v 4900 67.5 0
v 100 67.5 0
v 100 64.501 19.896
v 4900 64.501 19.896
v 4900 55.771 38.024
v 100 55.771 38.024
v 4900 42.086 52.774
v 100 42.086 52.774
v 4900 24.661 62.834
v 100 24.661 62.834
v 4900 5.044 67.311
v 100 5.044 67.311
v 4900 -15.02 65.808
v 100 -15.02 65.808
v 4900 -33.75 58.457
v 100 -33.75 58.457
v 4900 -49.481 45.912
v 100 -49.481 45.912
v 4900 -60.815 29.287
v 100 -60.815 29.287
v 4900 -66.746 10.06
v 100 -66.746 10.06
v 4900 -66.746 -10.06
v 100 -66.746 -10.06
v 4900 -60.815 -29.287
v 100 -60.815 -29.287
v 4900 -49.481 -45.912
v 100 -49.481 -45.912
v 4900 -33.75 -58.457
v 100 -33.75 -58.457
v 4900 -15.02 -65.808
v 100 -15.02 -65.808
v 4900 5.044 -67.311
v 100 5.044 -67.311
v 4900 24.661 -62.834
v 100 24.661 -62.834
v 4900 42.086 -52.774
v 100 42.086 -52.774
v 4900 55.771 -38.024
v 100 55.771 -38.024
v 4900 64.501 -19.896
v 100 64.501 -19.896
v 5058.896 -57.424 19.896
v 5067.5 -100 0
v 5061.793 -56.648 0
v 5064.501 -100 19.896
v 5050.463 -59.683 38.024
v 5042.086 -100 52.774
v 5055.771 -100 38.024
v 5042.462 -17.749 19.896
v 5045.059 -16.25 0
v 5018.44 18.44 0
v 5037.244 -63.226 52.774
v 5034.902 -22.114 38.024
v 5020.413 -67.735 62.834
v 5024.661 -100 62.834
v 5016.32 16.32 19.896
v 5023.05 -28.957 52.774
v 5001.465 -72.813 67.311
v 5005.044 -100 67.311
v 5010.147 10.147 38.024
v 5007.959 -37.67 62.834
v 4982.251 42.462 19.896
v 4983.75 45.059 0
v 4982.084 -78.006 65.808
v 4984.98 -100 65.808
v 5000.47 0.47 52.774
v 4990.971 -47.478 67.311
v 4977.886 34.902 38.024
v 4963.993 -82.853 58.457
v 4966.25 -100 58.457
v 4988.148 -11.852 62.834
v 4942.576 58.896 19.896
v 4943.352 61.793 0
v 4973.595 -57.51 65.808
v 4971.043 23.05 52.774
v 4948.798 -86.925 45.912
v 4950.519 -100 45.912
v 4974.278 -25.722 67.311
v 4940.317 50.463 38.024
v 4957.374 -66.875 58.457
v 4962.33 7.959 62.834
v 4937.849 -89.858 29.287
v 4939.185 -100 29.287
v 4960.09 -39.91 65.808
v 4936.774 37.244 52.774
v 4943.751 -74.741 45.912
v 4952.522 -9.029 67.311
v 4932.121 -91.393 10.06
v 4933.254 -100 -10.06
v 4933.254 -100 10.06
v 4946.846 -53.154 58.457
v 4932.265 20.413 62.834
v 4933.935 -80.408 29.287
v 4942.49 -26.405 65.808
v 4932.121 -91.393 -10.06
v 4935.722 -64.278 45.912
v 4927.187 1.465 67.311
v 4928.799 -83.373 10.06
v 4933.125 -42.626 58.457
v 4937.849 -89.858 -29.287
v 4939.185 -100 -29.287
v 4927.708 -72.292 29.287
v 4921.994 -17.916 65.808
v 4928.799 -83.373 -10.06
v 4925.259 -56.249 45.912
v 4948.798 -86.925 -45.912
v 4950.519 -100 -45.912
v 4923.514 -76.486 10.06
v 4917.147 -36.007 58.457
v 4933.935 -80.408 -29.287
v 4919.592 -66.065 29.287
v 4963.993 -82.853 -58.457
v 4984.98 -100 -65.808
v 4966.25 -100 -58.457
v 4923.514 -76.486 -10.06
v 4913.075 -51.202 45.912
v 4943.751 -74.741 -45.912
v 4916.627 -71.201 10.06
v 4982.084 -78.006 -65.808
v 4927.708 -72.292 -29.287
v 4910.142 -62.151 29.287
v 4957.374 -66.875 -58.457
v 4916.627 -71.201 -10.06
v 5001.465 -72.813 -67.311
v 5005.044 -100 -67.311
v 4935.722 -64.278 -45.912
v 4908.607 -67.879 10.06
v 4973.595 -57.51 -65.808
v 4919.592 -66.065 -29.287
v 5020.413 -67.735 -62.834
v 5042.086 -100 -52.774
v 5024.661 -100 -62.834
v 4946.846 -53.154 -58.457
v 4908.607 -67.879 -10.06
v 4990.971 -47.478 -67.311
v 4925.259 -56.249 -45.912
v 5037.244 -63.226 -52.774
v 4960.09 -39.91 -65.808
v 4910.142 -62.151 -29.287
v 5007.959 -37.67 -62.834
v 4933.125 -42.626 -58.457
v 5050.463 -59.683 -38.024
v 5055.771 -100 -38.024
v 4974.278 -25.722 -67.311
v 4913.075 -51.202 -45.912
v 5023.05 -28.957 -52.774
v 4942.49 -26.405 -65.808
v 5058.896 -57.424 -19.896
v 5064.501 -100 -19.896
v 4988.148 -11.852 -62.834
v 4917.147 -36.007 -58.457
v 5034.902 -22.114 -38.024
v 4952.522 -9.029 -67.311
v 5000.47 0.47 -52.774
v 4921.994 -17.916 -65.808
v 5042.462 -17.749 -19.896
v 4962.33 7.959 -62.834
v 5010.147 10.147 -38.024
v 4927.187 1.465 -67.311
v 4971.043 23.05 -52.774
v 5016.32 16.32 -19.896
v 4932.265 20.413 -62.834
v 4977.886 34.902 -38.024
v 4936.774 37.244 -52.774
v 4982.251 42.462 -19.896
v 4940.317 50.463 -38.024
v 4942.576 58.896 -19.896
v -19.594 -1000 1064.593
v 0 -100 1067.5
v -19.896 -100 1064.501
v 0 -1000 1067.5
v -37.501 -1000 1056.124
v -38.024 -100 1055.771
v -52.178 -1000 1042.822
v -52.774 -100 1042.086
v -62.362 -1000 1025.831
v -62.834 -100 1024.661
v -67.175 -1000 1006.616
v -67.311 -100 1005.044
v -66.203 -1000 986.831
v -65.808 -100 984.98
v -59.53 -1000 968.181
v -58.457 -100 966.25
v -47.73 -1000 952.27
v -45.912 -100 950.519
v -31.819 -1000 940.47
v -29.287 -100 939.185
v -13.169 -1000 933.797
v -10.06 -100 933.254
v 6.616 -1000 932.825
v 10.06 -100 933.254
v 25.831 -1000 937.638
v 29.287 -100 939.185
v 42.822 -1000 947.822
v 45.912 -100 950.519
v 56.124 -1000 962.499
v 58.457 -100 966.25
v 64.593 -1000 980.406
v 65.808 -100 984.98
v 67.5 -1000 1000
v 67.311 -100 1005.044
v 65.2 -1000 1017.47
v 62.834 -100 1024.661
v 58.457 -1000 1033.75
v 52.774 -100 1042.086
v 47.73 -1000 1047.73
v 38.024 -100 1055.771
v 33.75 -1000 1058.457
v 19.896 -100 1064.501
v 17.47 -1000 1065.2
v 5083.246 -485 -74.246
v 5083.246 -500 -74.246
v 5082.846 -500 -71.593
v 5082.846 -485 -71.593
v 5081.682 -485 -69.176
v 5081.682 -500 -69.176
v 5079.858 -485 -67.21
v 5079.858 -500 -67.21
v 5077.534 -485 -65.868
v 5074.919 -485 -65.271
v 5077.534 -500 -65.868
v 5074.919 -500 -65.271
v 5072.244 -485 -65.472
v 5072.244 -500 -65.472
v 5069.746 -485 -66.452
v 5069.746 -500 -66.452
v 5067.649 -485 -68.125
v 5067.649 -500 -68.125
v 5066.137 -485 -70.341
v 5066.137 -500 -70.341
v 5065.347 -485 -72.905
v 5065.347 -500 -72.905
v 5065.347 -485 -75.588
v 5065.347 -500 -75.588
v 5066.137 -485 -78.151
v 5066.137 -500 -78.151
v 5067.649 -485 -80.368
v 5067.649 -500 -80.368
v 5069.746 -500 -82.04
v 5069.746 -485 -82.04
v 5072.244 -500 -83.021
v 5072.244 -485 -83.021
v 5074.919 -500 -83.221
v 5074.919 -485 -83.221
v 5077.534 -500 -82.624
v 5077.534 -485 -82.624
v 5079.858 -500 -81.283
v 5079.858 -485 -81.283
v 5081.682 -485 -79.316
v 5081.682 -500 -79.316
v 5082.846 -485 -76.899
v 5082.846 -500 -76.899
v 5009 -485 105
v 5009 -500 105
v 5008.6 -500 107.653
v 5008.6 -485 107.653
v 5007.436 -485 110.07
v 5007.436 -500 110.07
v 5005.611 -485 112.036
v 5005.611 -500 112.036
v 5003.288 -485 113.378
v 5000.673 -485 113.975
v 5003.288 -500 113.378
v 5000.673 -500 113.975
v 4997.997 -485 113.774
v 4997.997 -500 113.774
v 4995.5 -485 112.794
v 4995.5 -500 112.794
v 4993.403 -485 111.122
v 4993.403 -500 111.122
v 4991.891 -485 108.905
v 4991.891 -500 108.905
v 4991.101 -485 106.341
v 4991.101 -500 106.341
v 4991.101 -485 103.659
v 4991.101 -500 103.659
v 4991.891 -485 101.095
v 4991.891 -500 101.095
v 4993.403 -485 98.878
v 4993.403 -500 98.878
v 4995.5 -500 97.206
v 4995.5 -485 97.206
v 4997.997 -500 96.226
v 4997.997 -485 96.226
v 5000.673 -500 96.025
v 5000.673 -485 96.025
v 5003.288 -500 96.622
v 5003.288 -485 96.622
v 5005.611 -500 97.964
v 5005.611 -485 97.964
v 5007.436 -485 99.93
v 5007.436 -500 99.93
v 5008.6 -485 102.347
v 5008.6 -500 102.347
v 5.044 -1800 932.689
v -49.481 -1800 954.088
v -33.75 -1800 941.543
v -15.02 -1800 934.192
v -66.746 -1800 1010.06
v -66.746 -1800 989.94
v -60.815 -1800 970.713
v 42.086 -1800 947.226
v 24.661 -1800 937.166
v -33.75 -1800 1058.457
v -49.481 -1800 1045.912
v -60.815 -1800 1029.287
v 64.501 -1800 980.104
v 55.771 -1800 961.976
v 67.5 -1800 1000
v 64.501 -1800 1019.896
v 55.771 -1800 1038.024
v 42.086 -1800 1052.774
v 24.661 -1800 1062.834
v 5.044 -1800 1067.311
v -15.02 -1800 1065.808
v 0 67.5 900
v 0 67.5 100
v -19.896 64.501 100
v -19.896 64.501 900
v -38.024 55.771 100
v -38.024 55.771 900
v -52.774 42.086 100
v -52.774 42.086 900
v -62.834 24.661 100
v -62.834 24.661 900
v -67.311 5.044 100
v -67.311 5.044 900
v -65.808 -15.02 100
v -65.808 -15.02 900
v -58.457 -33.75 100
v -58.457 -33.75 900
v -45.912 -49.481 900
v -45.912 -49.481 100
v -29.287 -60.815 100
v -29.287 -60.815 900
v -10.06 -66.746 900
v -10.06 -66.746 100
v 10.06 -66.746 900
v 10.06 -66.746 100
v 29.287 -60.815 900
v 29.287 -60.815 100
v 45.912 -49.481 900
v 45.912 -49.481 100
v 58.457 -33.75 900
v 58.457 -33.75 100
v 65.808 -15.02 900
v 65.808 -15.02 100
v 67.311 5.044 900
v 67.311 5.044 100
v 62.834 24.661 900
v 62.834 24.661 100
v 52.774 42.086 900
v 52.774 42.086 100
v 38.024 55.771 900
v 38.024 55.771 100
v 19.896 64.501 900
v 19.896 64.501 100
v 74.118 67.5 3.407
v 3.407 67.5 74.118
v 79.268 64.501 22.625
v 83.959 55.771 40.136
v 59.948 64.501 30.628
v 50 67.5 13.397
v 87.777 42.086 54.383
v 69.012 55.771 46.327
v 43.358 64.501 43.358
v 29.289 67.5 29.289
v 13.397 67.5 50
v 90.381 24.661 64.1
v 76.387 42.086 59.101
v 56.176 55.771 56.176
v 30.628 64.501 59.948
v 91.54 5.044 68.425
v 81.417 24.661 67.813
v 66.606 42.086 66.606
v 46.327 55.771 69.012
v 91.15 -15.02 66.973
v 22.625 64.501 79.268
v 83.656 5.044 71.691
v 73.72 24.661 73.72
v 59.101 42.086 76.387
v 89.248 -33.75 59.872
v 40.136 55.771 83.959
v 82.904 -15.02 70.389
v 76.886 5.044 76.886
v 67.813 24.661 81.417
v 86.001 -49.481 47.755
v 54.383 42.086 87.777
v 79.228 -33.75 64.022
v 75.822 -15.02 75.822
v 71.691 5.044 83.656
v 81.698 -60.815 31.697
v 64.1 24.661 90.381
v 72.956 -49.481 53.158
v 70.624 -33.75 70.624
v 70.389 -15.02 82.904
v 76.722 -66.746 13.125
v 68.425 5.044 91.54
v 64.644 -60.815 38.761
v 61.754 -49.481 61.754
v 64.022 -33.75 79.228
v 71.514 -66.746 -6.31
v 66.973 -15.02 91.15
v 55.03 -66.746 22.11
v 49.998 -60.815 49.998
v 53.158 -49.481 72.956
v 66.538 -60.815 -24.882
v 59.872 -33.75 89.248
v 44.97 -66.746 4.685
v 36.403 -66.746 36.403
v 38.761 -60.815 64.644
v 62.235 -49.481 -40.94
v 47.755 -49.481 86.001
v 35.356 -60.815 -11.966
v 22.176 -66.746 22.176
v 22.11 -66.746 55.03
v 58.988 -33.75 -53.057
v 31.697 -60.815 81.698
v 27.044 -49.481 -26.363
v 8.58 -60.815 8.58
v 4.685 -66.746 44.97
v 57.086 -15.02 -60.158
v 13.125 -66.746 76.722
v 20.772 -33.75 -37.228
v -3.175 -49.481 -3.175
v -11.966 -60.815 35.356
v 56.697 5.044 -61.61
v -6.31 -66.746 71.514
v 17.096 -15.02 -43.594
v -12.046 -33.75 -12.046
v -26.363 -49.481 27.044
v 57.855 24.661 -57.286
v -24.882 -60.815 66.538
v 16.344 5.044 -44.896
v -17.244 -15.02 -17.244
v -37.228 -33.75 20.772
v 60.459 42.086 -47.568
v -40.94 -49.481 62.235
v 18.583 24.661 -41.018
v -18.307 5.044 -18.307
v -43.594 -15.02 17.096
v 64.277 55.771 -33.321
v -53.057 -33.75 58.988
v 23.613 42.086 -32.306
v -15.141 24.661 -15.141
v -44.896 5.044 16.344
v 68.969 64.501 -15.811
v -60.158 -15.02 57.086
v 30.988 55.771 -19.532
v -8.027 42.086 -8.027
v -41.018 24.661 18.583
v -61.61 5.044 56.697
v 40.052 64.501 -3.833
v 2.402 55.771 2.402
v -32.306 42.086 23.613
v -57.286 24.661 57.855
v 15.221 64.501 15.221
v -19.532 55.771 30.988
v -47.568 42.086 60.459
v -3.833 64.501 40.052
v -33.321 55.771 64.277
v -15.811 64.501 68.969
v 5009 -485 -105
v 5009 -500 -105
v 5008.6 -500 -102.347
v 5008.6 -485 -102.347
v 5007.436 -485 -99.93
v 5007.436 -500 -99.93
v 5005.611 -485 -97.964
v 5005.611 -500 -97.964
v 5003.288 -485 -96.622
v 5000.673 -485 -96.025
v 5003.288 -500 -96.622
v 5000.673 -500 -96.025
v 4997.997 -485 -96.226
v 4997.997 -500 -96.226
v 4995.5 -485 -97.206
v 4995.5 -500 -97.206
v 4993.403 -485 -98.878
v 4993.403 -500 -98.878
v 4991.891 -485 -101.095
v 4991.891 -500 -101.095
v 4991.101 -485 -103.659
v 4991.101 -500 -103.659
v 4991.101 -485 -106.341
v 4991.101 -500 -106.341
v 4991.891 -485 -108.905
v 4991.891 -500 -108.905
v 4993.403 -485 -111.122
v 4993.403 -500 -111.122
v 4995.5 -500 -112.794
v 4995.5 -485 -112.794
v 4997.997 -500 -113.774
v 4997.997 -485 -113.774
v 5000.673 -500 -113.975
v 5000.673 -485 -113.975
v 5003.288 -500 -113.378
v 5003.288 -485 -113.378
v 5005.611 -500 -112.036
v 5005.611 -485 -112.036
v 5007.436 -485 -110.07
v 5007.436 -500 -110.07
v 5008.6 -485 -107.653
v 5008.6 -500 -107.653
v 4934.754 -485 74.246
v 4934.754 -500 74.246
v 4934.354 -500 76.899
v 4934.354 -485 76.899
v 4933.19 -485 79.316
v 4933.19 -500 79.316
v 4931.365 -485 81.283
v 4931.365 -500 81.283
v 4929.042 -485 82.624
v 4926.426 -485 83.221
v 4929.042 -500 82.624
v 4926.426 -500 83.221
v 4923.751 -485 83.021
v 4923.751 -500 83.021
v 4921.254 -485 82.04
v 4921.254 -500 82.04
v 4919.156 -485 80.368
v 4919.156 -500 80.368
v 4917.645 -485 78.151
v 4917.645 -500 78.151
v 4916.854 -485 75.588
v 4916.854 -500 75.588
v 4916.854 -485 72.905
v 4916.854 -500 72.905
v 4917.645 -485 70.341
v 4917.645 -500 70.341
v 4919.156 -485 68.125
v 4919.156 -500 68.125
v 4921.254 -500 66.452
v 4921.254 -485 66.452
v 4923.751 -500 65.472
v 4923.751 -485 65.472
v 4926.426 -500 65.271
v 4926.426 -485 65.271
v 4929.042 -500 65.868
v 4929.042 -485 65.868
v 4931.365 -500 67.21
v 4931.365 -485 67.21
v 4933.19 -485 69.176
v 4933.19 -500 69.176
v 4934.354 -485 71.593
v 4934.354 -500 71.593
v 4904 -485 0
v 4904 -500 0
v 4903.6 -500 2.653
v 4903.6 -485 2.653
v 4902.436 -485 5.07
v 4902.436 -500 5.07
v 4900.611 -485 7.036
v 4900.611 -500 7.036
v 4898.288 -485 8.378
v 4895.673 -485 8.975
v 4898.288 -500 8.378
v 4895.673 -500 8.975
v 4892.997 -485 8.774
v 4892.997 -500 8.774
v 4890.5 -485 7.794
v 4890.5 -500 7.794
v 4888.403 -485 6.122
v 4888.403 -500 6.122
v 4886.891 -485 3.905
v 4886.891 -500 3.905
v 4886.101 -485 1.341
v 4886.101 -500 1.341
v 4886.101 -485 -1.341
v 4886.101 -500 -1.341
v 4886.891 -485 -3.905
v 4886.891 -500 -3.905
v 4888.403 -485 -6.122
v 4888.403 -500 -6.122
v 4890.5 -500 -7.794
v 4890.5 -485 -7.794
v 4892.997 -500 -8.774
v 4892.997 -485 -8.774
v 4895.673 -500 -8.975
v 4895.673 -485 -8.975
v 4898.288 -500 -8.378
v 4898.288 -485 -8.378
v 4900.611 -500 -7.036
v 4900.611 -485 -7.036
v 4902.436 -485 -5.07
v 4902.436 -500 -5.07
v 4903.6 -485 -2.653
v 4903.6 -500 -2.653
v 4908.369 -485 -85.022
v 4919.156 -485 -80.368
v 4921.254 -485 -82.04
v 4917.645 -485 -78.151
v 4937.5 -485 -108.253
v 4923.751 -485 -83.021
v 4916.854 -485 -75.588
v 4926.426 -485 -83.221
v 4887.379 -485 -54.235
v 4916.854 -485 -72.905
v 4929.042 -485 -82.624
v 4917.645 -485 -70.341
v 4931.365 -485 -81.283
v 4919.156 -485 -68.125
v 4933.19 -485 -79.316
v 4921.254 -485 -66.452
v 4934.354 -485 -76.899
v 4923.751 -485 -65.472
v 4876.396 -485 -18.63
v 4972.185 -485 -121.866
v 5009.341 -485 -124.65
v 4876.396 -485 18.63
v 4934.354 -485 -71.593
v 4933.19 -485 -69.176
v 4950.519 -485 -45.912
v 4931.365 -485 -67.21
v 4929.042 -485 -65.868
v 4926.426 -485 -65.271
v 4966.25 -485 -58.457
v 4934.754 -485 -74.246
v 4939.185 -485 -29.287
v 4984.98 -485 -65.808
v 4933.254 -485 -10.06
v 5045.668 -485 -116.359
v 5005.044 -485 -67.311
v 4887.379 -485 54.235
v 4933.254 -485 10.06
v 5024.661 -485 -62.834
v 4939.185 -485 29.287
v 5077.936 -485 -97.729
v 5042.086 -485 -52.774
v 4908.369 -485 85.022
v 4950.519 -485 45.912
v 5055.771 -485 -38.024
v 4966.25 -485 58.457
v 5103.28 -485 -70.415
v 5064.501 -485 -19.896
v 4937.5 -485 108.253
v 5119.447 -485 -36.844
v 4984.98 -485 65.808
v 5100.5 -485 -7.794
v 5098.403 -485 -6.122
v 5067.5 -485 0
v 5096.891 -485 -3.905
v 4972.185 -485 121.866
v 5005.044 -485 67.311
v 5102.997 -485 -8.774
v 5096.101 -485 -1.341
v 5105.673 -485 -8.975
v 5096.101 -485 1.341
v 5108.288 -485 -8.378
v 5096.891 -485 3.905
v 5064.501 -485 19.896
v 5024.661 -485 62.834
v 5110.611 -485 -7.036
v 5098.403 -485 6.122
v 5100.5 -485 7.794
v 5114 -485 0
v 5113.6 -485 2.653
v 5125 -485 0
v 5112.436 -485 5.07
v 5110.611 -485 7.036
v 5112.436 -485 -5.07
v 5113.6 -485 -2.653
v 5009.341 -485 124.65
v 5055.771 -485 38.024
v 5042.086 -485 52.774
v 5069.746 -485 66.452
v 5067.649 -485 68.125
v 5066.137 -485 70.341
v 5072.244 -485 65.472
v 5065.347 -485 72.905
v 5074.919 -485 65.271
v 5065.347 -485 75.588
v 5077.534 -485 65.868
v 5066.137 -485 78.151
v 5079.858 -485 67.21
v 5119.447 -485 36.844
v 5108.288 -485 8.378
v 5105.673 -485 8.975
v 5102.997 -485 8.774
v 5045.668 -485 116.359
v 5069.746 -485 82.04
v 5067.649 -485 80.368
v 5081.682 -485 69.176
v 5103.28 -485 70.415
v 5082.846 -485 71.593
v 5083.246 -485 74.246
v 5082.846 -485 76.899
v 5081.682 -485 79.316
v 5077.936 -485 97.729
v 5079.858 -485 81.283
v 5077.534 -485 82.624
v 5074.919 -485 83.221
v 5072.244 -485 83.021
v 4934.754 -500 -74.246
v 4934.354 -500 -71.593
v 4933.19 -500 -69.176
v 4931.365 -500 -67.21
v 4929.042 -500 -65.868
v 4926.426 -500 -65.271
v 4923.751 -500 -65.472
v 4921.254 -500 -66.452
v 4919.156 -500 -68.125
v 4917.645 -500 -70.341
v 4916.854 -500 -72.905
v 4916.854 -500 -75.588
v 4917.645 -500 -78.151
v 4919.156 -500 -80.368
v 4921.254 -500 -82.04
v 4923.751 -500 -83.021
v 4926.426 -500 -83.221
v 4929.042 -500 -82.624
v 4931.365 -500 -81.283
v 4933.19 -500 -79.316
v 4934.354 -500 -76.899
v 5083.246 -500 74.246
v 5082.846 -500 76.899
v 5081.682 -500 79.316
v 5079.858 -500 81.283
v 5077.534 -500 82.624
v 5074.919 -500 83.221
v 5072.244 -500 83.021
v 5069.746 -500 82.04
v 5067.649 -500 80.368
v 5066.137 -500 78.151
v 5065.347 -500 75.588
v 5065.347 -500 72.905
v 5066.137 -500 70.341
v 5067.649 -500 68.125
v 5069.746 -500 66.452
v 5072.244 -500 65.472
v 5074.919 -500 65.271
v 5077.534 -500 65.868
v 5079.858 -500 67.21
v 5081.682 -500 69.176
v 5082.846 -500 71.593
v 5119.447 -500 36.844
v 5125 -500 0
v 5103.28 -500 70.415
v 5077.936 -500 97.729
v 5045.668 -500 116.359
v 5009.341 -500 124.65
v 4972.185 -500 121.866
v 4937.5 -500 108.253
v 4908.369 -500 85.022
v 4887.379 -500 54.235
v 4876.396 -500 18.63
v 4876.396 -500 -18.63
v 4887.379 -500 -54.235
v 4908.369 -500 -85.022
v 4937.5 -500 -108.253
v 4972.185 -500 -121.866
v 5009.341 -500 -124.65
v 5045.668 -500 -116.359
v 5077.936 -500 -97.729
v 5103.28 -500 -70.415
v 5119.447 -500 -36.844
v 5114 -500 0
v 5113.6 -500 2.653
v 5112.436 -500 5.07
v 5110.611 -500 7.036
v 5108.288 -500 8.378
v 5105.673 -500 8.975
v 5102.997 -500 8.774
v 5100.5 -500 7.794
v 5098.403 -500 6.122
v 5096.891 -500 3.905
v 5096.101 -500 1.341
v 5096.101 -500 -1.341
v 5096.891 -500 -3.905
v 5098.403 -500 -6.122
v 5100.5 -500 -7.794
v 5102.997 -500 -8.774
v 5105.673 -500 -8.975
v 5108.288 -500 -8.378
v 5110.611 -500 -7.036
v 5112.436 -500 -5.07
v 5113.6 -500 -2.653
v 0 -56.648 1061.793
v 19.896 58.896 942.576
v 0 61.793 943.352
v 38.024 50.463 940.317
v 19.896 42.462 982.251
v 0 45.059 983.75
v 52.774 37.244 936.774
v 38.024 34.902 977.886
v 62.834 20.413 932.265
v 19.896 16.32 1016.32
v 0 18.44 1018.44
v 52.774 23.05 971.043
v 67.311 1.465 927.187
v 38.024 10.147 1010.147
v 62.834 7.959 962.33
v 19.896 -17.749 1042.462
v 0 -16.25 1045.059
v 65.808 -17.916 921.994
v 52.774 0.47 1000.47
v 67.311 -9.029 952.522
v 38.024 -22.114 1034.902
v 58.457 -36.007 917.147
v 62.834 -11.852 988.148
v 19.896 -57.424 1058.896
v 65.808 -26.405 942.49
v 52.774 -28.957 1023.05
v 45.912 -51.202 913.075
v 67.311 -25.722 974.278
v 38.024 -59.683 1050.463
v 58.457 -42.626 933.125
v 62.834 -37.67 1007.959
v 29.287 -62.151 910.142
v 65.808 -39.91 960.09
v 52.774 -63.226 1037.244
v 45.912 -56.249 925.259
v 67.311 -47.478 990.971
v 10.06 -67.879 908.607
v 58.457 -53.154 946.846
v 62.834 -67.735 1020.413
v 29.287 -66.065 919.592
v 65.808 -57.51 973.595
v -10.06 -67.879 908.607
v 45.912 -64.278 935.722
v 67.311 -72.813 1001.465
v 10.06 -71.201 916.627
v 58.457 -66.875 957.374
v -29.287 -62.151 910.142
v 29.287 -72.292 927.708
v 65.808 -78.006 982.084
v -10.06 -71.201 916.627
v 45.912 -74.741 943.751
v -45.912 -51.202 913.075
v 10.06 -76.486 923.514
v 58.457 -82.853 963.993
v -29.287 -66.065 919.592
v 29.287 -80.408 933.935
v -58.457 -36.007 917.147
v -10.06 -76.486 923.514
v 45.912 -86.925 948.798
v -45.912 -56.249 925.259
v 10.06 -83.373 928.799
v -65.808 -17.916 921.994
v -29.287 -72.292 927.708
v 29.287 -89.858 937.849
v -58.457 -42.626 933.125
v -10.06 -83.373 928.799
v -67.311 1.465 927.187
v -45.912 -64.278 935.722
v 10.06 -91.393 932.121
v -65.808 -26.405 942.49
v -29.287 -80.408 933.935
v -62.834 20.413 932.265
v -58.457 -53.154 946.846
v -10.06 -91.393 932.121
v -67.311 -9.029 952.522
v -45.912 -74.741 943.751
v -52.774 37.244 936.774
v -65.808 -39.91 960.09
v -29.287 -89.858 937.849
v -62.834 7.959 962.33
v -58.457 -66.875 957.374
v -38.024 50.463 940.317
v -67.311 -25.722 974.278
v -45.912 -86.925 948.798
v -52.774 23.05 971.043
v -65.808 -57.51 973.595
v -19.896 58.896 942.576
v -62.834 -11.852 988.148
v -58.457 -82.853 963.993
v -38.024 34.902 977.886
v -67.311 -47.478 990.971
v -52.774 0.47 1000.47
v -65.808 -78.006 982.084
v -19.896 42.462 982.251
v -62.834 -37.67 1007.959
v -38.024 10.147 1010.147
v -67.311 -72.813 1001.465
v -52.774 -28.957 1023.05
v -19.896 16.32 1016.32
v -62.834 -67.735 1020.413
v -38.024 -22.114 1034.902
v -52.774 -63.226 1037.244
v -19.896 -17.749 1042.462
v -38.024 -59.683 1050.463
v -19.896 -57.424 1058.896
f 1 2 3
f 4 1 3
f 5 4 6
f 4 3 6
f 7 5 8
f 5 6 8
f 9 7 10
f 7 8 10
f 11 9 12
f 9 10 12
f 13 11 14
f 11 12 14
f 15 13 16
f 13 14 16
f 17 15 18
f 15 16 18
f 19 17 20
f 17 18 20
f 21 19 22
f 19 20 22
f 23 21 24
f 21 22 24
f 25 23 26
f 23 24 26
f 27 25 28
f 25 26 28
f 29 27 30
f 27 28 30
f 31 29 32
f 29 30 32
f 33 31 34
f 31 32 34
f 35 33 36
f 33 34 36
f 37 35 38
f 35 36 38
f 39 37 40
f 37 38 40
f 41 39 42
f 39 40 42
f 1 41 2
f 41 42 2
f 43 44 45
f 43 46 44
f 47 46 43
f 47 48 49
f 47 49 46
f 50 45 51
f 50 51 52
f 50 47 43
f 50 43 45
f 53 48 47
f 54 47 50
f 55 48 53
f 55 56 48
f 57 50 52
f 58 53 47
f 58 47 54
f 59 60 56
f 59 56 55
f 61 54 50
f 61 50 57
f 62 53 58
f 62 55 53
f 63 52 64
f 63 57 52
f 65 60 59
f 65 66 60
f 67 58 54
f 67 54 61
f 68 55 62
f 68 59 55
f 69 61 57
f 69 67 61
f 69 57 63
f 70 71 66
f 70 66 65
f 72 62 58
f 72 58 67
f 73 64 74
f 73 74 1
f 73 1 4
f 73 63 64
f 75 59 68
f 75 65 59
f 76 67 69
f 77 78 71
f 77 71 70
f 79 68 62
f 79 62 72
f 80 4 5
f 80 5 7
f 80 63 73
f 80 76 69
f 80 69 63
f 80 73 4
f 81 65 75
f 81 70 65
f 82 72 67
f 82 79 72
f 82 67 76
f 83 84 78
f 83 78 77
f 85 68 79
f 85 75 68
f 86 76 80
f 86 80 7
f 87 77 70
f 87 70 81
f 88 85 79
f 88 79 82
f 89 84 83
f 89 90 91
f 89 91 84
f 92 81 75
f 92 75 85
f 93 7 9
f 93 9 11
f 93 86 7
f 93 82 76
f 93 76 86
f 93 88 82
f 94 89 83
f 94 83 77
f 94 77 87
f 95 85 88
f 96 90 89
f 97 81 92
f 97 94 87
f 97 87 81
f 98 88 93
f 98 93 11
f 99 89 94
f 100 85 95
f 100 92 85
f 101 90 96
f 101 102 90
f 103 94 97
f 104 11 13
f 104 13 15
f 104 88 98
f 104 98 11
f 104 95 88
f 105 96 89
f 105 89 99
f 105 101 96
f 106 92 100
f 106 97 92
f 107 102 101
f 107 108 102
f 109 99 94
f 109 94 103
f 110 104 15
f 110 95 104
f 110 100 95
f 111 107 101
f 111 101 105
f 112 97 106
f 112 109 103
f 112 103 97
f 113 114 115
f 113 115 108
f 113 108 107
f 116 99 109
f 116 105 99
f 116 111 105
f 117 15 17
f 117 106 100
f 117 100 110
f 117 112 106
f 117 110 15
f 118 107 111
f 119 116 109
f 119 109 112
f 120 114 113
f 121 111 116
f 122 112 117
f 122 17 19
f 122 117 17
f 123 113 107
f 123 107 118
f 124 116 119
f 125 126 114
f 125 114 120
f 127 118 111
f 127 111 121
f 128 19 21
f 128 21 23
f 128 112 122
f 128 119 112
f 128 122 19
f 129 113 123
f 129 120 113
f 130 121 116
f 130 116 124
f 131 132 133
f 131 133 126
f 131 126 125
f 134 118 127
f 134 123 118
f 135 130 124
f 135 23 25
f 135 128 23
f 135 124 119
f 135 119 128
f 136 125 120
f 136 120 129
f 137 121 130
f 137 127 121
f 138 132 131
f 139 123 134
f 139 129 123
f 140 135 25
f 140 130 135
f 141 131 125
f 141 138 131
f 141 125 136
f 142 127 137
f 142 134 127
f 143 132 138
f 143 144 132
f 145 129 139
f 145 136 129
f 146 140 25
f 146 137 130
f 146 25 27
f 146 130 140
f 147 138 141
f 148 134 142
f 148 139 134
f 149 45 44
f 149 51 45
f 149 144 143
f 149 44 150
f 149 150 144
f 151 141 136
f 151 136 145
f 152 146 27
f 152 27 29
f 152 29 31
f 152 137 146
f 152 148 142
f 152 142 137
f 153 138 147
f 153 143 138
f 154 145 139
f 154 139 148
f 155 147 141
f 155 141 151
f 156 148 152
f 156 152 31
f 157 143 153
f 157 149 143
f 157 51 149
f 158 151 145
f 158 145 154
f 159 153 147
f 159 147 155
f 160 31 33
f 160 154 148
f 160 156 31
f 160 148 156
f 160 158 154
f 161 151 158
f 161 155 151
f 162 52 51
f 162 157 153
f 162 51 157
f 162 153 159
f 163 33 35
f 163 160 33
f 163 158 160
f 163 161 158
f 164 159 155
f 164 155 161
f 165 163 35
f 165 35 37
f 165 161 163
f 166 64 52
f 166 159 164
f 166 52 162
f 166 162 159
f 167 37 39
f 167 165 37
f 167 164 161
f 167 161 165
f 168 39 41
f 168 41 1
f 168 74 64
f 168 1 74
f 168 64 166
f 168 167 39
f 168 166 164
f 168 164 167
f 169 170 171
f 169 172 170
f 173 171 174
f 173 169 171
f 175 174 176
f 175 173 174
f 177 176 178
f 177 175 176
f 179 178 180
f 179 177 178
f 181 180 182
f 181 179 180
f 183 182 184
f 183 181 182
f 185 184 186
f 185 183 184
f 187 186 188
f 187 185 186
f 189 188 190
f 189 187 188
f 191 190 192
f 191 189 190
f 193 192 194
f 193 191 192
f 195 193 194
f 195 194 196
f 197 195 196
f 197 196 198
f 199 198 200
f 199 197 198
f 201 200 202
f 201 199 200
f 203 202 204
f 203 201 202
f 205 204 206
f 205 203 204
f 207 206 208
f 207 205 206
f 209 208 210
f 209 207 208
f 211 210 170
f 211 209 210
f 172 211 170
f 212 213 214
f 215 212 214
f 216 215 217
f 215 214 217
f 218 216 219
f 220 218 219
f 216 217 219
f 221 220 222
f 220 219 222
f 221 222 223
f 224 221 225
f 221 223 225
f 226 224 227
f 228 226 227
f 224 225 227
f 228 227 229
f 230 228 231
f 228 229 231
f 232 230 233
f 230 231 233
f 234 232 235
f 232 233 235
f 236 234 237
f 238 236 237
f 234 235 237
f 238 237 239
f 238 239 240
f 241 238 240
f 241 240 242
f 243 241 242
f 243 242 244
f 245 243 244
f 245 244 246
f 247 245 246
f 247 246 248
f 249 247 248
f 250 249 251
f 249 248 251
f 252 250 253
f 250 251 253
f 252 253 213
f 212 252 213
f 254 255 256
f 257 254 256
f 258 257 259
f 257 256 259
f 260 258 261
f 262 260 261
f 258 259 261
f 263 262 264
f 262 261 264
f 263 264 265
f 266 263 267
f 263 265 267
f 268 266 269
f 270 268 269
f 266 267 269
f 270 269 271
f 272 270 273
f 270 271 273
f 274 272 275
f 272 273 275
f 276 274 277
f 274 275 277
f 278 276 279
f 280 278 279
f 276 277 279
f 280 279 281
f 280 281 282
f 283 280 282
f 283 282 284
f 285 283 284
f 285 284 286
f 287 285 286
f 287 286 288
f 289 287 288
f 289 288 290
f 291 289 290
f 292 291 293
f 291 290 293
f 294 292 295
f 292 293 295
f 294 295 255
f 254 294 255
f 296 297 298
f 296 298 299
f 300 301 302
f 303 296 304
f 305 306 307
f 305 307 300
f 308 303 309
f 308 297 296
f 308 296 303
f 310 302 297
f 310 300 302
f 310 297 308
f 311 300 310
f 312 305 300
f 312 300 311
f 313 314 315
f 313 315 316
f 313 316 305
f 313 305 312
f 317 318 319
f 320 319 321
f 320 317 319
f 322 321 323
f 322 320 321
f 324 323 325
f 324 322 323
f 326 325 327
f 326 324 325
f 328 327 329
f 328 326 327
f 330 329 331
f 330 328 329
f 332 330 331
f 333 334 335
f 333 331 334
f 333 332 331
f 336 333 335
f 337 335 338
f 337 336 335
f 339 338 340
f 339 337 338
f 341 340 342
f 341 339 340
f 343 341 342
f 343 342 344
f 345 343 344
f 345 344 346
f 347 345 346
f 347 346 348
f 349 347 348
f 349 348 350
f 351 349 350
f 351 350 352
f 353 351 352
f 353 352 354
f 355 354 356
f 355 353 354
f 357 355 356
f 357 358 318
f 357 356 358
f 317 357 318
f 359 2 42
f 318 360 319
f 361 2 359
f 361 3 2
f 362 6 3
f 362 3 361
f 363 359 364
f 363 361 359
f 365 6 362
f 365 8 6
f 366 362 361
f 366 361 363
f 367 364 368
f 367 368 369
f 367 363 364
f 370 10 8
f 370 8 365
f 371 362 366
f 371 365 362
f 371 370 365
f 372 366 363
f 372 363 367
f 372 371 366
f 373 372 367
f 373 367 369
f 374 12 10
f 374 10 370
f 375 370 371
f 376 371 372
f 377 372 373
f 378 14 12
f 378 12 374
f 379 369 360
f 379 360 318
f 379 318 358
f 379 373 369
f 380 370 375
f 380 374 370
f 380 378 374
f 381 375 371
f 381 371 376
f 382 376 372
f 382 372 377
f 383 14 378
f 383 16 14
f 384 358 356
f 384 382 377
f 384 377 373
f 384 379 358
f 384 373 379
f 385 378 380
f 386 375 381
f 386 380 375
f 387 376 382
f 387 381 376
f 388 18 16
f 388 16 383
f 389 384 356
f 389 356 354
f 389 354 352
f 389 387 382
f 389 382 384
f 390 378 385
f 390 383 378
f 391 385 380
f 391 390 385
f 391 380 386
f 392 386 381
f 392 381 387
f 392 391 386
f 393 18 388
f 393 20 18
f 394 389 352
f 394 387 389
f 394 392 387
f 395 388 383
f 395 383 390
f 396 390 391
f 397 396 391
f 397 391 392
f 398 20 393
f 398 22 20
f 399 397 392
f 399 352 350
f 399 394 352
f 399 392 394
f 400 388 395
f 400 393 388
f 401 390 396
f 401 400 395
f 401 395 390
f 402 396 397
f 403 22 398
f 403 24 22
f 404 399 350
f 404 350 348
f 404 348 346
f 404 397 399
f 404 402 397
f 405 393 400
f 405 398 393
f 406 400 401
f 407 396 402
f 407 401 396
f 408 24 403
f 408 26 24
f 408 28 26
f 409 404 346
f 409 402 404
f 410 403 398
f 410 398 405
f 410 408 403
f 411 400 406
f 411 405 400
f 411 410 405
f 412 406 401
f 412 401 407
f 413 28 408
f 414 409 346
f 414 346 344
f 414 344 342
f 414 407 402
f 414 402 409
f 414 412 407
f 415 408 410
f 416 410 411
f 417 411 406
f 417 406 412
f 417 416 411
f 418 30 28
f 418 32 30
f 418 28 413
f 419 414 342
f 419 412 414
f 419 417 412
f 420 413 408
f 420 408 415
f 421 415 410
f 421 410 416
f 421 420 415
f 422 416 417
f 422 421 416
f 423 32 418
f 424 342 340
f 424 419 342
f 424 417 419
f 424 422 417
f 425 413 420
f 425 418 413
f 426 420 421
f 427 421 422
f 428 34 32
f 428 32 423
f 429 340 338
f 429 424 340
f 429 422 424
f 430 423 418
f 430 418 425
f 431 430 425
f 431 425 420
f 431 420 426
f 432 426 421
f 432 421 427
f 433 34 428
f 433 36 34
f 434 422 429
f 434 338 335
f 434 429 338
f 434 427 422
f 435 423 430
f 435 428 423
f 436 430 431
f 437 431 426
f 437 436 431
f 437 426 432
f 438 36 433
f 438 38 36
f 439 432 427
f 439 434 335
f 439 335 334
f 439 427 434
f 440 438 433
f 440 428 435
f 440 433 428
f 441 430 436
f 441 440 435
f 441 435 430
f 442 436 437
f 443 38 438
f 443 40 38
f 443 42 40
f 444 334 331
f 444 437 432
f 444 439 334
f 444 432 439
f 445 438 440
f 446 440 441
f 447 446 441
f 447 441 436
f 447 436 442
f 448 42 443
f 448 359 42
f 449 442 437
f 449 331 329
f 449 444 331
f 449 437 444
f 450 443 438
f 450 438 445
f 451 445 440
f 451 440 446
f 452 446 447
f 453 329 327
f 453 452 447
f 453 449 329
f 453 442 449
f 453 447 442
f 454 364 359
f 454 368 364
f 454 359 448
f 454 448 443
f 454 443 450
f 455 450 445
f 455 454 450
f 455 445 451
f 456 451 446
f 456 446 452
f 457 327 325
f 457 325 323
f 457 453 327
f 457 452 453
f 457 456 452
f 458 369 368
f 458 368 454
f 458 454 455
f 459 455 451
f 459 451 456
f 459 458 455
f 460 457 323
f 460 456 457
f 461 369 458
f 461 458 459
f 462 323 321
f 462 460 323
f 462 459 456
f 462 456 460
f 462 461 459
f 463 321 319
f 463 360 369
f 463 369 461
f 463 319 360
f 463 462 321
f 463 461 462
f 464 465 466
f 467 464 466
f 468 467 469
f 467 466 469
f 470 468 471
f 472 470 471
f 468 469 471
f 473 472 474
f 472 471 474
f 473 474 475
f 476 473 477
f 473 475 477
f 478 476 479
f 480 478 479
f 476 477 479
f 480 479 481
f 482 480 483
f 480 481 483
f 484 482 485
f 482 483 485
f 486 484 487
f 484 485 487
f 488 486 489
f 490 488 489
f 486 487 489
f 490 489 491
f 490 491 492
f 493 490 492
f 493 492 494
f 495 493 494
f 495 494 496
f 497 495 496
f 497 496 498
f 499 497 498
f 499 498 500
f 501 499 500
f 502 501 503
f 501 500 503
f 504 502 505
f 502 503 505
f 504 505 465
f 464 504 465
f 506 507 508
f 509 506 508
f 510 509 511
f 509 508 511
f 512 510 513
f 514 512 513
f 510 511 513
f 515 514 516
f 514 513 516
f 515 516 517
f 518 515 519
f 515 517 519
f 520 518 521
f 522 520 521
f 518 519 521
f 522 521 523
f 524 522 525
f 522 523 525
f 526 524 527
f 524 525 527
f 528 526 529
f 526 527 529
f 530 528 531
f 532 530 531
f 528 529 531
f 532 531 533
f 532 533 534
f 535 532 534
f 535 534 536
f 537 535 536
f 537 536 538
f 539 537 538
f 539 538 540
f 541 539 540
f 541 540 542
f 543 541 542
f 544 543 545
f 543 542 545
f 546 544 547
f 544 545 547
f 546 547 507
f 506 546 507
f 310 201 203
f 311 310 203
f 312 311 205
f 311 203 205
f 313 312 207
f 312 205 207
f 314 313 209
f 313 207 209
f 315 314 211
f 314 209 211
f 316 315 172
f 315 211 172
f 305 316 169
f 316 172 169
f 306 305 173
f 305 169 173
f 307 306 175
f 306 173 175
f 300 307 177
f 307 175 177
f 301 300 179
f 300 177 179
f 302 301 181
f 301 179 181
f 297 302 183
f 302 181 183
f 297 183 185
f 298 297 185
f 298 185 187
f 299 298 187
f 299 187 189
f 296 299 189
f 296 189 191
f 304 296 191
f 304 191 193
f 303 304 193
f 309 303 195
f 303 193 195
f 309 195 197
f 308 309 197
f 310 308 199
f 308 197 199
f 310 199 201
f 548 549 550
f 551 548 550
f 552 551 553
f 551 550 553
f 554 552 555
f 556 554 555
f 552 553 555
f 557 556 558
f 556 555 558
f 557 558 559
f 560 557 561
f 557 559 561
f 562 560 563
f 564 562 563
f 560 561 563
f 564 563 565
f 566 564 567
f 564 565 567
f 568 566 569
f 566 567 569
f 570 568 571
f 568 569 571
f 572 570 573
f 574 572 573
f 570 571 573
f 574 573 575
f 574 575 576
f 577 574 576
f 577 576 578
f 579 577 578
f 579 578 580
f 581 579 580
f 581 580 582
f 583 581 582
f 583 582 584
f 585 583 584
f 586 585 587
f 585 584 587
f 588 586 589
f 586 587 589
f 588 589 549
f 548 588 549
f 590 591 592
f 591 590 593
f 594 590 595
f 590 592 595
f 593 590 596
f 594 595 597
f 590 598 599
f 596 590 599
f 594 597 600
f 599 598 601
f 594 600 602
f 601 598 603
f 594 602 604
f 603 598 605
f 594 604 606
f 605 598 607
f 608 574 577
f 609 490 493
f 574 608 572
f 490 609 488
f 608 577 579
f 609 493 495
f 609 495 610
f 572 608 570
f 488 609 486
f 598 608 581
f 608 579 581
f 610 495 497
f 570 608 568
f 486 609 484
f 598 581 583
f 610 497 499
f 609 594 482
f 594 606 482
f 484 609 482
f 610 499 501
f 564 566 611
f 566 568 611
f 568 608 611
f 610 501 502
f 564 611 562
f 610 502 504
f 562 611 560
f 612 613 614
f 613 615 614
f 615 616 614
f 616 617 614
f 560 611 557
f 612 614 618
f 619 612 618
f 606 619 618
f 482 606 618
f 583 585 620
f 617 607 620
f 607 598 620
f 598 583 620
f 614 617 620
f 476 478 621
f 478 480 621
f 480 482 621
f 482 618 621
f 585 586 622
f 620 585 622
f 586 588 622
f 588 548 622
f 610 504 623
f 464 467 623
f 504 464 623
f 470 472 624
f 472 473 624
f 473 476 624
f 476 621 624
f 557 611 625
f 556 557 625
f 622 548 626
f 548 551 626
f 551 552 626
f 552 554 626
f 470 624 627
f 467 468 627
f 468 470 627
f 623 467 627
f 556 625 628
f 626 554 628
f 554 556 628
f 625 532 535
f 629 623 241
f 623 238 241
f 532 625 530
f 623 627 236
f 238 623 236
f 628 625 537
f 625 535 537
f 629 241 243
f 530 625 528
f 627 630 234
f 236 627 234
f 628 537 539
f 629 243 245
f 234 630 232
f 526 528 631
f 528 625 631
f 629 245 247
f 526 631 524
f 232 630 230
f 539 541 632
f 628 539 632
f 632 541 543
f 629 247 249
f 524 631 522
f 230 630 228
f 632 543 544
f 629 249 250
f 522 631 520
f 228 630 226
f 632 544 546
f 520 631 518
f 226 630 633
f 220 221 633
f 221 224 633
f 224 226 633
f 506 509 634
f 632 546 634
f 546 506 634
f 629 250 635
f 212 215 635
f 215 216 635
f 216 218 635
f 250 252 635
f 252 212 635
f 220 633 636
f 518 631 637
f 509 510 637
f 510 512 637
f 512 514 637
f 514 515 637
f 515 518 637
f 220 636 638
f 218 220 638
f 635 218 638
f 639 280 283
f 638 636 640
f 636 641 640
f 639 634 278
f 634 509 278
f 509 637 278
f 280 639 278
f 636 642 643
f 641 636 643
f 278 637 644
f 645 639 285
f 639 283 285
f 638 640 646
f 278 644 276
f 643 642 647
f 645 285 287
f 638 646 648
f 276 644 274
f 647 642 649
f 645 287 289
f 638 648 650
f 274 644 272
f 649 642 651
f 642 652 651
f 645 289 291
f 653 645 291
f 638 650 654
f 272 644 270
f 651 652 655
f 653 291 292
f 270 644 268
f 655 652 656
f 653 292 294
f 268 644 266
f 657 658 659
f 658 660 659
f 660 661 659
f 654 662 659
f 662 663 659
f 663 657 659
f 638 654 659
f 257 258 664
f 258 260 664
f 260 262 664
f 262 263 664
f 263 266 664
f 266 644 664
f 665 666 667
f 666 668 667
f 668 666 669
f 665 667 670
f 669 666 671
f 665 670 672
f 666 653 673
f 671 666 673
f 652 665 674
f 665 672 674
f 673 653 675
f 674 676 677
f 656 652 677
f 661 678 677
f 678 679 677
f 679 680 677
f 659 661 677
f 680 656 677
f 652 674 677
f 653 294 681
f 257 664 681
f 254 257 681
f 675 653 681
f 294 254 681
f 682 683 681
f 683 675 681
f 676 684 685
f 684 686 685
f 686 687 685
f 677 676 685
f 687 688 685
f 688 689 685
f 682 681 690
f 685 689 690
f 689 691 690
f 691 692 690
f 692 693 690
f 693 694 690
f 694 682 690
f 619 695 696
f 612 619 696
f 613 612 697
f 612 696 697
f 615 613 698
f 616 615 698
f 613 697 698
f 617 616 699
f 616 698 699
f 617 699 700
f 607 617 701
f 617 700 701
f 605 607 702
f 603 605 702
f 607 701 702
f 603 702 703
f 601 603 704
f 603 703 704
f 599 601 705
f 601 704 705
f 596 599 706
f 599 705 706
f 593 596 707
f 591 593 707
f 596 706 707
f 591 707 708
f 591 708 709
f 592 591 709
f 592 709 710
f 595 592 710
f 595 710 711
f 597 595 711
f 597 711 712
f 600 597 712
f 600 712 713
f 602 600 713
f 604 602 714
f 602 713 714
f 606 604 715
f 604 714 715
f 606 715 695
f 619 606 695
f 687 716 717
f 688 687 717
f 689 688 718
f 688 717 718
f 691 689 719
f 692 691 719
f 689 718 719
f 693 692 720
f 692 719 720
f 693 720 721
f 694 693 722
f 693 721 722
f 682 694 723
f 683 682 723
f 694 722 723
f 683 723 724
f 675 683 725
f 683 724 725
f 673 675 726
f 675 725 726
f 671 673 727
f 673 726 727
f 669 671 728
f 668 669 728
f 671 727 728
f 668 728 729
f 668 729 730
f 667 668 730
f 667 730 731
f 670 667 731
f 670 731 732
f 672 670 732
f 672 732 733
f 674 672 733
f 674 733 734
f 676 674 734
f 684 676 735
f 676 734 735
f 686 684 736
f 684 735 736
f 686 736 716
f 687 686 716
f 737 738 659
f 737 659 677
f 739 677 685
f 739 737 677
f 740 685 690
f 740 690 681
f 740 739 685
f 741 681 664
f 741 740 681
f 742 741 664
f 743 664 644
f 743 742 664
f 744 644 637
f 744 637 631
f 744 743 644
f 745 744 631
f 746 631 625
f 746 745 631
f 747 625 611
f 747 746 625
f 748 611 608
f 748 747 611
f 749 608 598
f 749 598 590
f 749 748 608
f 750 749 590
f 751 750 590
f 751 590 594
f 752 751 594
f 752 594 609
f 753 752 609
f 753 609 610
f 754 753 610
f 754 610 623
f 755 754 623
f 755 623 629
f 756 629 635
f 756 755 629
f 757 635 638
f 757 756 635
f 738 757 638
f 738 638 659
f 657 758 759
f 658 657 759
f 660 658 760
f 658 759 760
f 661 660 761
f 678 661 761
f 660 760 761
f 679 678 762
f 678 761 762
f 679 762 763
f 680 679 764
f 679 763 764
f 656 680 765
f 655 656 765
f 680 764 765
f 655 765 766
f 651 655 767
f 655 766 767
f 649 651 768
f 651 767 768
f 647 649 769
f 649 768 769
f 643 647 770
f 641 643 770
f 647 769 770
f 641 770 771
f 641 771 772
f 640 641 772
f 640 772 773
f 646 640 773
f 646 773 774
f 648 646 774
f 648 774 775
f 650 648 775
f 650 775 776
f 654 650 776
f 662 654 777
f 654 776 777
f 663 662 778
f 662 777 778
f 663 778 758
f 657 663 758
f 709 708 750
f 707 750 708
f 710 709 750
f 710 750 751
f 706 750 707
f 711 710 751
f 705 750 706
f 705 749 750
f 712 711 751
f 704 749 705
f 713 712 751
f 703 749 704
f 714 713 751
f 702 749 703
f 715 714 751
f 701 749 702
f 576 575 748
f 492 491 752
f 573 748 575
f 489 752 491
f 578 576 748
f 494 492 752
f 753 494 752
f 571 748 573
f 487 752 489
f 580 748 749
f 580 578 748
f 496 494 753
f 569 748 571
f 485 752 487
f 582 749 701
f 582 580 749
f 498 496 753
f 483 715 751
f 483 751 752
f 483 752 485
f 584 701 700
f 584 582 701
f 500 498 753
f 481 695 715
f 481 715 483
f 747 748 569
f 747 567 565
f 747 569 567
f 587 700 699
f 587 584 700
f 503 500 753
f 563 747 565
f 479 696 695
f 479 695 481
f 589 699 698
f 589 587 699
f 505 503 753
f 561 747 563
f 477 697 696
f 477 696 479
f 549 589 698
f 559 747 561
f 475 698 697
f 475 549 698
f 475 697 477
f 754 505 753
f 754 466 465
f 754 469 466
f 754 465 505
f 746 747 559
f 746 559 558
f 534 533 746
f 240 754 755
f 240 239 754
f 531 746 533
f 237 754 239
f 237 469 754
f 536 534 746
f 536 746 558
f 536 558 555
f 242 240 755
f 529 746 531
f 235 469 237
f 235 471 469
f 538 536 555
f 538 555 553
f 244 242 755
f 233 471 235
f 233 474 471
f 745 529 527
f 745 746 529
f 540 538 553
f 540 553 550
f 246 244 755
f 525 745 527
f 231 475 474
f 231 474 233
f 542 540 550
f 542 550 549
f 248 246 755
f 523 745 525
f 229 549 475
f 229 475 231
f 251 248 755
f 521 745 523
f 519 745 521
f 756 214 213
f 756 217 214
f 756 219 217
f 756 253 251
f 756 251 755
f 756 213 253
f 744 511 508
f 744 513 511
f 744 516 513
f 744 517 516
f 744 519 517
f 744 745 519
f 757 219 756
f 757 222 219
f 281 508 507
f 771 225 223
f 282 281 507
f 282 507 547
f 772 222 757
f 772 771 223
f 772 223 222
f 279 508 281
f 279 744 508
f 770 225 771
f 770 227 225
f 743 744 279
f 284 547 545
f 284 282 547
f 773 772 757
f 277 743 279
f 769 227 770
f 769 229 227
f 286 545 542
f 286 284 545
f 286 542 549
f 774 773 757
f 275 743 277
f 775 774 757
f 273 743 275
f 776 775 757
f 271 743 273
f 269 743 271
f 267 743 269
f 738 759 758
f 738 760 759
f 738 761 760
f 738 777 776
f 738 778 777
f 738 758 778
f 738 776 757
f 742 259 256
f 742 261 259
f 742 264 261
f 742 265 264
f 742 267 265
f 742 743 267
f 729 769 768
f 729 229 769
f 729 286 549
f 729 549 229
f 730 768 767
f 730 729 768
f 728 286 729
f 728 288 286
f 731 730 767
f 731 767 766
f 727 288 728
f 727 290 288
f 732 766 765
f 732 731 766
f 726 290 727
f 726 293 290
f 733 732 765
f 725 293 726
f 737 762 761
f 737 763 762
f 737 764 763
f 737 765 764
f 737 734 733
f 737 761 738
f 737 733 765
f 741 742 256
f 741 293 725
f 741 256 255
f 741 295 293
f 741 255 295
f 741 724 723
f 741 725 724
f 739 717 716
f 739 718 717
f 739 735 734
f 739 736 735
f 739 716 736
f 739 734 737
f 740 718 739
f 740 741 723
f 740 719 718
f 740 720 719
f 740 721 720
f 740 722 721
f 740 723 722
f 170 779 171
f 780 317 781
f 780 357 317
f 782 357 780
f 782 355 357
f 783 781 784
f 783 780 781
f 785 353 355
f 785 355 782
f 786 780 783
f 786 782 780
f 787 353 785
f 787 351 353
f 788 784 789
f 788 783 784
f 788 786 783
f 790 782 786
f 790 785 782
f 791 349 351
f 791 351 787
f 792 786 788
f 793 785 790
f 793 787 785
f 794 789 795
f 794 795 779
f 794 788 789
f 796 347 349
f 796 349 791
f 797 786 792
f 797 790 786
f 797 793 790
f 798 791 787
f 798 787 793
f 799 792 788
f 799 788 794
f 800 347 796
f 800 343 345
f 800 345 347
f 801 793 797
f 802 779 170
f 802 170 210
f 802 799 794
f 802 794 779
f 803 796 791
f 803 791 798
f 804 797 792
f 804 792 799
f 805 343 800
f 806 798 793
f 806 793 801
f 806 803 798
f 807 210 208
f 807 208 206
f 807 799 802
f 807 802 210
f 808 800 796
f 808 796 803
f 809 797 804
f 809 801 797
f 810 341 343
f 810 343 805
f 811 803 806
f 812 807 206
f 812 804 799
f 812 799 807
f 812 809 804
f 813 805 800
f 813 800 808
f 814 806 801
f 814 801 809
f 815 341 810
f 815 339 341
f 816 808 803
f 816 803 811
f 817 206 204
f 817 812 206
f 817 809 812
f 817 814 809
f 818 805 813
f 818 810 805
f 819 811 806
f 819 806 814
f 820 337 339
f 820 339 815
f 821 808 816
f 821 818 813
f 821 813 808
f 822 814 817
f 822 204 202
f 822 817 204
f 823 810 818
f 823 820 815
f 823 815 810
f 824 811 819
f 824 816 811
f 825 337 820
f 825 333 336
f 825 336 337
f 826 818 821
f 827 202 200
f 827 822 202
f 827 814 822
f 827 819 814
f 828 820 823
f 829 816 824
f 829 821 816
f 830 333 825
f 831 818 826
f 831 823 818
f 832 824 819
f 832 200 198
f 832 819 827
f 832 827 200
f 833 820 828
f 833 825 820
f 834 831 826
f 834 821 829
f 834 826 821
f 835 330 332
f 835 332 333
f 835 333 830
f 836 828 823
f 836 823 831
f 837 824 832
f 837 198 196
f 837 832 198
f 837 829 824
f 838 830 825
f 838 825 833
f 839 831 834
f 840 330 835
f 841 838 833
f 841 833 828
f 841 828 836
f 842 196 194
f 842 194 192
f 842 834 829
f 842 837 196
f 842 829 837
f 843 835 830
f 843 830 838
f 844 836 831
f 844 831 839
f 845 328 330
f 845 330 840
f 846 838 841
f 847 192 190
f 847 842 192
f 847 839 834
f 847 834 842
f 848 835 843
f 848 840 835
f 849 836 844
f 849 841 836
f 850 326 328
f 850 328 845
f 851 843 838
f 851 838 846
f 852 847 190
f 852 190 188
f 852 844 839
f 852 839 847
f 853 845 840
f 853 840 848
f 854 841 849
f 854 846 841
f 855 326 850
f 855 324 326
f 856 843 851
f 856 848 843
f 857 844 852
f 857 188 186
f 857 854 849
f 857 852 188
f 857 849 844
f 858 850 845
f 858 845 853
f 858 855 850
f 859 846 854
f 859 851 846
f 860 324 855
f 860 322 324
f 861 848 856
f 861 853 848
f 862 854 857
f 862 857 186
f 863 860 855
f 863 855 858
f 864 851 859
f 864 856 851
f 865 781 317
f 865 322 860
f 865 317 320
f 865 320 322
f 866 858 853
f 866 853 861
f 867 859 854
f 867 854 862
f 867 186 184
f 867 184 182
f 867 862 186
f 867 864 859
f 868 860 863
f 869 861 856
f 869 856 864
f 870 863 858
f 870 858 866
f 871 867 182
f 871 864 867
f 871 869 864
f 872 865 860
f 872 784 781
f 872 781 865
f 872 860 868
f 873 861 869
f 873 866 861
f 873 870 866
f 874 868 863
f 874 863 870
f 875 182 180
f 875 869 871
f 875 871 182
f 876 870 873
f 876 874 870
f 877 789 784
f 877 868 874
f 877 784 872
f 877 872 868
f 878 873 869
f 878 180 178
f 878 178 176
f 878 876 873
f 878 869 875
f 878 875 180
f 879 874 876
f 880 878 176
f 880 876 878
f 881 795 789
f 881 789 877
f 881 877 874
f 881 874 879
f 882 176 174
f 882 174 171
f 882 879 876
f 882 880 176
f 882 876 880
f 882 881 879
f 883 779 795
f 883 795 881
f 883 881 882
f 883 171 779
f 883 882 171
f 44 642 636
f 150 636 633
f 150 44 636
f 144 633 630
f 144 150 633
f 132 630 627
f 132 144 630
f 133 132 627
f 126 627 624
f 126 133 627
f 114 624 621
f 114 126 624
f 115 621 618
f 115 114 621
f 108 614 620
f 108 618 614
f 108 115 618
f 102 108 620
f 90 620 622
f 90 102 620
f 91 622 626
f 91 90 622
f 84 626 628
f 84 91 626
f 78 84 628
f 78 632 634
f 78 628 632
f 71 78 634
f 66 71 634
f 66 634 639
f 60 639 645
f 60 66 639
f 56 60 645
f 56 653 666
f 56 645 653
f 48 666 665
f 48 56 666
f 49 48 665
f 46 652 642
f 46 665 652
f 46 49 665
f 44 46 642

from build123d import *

# Parameters (mm, degrees)
F3_R     = 67.5
F3_R_2   = 125
F3_R_3   = 9
F6_DEPTH = 15
F7_R     = 67.5
F8_DEPTH = 800


with BuildPart() as f5:
    # F5: sweep along a path in F0, F1, F4
    with BuildLine(Plane.XY) as f5_path:
        Line((5000, -500), (5000, -100))
        ThreePointArc((5000, -100), (4970.7106781187, -29.2893218813), (4900, 0))
    with BuildLine(Plane.XZ) as f5_path_2:
        Line((4900, 0), (100, 0))
        ThreePointArc((100, 0), (29.2893218813, 29.2893218813), (0, 100))
    with BuildLine(Plane.YZ) as f5_path_3:
        Line((0, 100), (0, 900))
        ThreePointArc((0, 900), (-29.2893218813, 970.7106781187), (-100, 1000))
        Line((-100, 1000), (-1000, 1000))
    # F3 (on offset) → F5 (sweep)
    with BuildSketch(Plane.XZ.offset(500)):
        with Locations((5000, 0)):
            Circle(F3_R)
    sweep(path=f5_path.line + f5_path_2.line + f5_path_3.line)

    # F3 (on offset) → F6 (join)
    with BuildSketch(Plane.XZ.offset(500)):
        with Locations((5000, 0)):
            Circle(F3_R_2)
        with Locations((4925.7537879754, -74.2462120246)):
            Circle(F3_R_3, mode=Mode.SUBTRACT)
        with Locations((5000, -105)):
            Circle(F3_R_3, mode=Mode.SUBTRACT)
        with Locations((5074.2462120246, -74.2462120246)):
            Circle(F3_R_3, mode=Mode.SUBTRACT)
        with Locations((4895, 0)):
            Circle(F3_R_3, mode=Mode.SUBTRACT)
        with Locations((4925.7537879754, 74.2462120246)):
            Circle(F3_R_3, mode=Mode.SUBTRACT)
        with Locations((5000, 0)):
            Circle(F3_R, mode=Mode.SUBTRACT)
        with Locations((5105, 0)):
            Circle(F3_R_3, mode=Mode.SUBTRACT)
        with Locations((5000, 105)):
            Circle(F3_R_3, mode=Mode.SUBTRACT)
        with Locations((5074.2462120246, 74.2462120246)):
            Circle(F3_R_3, mode=Mode.SUBTRACT)
    extrude(amount=-F6_DEPTH)

    # F7 (on face) → F8 (join)
    with BuildSketch(Plane.XZ.offset(1000)):
        with Locations((0, 1000)):
            Circle(F7_R)
    extrude(amount=F8_DEPTH)


solid = f5.part
